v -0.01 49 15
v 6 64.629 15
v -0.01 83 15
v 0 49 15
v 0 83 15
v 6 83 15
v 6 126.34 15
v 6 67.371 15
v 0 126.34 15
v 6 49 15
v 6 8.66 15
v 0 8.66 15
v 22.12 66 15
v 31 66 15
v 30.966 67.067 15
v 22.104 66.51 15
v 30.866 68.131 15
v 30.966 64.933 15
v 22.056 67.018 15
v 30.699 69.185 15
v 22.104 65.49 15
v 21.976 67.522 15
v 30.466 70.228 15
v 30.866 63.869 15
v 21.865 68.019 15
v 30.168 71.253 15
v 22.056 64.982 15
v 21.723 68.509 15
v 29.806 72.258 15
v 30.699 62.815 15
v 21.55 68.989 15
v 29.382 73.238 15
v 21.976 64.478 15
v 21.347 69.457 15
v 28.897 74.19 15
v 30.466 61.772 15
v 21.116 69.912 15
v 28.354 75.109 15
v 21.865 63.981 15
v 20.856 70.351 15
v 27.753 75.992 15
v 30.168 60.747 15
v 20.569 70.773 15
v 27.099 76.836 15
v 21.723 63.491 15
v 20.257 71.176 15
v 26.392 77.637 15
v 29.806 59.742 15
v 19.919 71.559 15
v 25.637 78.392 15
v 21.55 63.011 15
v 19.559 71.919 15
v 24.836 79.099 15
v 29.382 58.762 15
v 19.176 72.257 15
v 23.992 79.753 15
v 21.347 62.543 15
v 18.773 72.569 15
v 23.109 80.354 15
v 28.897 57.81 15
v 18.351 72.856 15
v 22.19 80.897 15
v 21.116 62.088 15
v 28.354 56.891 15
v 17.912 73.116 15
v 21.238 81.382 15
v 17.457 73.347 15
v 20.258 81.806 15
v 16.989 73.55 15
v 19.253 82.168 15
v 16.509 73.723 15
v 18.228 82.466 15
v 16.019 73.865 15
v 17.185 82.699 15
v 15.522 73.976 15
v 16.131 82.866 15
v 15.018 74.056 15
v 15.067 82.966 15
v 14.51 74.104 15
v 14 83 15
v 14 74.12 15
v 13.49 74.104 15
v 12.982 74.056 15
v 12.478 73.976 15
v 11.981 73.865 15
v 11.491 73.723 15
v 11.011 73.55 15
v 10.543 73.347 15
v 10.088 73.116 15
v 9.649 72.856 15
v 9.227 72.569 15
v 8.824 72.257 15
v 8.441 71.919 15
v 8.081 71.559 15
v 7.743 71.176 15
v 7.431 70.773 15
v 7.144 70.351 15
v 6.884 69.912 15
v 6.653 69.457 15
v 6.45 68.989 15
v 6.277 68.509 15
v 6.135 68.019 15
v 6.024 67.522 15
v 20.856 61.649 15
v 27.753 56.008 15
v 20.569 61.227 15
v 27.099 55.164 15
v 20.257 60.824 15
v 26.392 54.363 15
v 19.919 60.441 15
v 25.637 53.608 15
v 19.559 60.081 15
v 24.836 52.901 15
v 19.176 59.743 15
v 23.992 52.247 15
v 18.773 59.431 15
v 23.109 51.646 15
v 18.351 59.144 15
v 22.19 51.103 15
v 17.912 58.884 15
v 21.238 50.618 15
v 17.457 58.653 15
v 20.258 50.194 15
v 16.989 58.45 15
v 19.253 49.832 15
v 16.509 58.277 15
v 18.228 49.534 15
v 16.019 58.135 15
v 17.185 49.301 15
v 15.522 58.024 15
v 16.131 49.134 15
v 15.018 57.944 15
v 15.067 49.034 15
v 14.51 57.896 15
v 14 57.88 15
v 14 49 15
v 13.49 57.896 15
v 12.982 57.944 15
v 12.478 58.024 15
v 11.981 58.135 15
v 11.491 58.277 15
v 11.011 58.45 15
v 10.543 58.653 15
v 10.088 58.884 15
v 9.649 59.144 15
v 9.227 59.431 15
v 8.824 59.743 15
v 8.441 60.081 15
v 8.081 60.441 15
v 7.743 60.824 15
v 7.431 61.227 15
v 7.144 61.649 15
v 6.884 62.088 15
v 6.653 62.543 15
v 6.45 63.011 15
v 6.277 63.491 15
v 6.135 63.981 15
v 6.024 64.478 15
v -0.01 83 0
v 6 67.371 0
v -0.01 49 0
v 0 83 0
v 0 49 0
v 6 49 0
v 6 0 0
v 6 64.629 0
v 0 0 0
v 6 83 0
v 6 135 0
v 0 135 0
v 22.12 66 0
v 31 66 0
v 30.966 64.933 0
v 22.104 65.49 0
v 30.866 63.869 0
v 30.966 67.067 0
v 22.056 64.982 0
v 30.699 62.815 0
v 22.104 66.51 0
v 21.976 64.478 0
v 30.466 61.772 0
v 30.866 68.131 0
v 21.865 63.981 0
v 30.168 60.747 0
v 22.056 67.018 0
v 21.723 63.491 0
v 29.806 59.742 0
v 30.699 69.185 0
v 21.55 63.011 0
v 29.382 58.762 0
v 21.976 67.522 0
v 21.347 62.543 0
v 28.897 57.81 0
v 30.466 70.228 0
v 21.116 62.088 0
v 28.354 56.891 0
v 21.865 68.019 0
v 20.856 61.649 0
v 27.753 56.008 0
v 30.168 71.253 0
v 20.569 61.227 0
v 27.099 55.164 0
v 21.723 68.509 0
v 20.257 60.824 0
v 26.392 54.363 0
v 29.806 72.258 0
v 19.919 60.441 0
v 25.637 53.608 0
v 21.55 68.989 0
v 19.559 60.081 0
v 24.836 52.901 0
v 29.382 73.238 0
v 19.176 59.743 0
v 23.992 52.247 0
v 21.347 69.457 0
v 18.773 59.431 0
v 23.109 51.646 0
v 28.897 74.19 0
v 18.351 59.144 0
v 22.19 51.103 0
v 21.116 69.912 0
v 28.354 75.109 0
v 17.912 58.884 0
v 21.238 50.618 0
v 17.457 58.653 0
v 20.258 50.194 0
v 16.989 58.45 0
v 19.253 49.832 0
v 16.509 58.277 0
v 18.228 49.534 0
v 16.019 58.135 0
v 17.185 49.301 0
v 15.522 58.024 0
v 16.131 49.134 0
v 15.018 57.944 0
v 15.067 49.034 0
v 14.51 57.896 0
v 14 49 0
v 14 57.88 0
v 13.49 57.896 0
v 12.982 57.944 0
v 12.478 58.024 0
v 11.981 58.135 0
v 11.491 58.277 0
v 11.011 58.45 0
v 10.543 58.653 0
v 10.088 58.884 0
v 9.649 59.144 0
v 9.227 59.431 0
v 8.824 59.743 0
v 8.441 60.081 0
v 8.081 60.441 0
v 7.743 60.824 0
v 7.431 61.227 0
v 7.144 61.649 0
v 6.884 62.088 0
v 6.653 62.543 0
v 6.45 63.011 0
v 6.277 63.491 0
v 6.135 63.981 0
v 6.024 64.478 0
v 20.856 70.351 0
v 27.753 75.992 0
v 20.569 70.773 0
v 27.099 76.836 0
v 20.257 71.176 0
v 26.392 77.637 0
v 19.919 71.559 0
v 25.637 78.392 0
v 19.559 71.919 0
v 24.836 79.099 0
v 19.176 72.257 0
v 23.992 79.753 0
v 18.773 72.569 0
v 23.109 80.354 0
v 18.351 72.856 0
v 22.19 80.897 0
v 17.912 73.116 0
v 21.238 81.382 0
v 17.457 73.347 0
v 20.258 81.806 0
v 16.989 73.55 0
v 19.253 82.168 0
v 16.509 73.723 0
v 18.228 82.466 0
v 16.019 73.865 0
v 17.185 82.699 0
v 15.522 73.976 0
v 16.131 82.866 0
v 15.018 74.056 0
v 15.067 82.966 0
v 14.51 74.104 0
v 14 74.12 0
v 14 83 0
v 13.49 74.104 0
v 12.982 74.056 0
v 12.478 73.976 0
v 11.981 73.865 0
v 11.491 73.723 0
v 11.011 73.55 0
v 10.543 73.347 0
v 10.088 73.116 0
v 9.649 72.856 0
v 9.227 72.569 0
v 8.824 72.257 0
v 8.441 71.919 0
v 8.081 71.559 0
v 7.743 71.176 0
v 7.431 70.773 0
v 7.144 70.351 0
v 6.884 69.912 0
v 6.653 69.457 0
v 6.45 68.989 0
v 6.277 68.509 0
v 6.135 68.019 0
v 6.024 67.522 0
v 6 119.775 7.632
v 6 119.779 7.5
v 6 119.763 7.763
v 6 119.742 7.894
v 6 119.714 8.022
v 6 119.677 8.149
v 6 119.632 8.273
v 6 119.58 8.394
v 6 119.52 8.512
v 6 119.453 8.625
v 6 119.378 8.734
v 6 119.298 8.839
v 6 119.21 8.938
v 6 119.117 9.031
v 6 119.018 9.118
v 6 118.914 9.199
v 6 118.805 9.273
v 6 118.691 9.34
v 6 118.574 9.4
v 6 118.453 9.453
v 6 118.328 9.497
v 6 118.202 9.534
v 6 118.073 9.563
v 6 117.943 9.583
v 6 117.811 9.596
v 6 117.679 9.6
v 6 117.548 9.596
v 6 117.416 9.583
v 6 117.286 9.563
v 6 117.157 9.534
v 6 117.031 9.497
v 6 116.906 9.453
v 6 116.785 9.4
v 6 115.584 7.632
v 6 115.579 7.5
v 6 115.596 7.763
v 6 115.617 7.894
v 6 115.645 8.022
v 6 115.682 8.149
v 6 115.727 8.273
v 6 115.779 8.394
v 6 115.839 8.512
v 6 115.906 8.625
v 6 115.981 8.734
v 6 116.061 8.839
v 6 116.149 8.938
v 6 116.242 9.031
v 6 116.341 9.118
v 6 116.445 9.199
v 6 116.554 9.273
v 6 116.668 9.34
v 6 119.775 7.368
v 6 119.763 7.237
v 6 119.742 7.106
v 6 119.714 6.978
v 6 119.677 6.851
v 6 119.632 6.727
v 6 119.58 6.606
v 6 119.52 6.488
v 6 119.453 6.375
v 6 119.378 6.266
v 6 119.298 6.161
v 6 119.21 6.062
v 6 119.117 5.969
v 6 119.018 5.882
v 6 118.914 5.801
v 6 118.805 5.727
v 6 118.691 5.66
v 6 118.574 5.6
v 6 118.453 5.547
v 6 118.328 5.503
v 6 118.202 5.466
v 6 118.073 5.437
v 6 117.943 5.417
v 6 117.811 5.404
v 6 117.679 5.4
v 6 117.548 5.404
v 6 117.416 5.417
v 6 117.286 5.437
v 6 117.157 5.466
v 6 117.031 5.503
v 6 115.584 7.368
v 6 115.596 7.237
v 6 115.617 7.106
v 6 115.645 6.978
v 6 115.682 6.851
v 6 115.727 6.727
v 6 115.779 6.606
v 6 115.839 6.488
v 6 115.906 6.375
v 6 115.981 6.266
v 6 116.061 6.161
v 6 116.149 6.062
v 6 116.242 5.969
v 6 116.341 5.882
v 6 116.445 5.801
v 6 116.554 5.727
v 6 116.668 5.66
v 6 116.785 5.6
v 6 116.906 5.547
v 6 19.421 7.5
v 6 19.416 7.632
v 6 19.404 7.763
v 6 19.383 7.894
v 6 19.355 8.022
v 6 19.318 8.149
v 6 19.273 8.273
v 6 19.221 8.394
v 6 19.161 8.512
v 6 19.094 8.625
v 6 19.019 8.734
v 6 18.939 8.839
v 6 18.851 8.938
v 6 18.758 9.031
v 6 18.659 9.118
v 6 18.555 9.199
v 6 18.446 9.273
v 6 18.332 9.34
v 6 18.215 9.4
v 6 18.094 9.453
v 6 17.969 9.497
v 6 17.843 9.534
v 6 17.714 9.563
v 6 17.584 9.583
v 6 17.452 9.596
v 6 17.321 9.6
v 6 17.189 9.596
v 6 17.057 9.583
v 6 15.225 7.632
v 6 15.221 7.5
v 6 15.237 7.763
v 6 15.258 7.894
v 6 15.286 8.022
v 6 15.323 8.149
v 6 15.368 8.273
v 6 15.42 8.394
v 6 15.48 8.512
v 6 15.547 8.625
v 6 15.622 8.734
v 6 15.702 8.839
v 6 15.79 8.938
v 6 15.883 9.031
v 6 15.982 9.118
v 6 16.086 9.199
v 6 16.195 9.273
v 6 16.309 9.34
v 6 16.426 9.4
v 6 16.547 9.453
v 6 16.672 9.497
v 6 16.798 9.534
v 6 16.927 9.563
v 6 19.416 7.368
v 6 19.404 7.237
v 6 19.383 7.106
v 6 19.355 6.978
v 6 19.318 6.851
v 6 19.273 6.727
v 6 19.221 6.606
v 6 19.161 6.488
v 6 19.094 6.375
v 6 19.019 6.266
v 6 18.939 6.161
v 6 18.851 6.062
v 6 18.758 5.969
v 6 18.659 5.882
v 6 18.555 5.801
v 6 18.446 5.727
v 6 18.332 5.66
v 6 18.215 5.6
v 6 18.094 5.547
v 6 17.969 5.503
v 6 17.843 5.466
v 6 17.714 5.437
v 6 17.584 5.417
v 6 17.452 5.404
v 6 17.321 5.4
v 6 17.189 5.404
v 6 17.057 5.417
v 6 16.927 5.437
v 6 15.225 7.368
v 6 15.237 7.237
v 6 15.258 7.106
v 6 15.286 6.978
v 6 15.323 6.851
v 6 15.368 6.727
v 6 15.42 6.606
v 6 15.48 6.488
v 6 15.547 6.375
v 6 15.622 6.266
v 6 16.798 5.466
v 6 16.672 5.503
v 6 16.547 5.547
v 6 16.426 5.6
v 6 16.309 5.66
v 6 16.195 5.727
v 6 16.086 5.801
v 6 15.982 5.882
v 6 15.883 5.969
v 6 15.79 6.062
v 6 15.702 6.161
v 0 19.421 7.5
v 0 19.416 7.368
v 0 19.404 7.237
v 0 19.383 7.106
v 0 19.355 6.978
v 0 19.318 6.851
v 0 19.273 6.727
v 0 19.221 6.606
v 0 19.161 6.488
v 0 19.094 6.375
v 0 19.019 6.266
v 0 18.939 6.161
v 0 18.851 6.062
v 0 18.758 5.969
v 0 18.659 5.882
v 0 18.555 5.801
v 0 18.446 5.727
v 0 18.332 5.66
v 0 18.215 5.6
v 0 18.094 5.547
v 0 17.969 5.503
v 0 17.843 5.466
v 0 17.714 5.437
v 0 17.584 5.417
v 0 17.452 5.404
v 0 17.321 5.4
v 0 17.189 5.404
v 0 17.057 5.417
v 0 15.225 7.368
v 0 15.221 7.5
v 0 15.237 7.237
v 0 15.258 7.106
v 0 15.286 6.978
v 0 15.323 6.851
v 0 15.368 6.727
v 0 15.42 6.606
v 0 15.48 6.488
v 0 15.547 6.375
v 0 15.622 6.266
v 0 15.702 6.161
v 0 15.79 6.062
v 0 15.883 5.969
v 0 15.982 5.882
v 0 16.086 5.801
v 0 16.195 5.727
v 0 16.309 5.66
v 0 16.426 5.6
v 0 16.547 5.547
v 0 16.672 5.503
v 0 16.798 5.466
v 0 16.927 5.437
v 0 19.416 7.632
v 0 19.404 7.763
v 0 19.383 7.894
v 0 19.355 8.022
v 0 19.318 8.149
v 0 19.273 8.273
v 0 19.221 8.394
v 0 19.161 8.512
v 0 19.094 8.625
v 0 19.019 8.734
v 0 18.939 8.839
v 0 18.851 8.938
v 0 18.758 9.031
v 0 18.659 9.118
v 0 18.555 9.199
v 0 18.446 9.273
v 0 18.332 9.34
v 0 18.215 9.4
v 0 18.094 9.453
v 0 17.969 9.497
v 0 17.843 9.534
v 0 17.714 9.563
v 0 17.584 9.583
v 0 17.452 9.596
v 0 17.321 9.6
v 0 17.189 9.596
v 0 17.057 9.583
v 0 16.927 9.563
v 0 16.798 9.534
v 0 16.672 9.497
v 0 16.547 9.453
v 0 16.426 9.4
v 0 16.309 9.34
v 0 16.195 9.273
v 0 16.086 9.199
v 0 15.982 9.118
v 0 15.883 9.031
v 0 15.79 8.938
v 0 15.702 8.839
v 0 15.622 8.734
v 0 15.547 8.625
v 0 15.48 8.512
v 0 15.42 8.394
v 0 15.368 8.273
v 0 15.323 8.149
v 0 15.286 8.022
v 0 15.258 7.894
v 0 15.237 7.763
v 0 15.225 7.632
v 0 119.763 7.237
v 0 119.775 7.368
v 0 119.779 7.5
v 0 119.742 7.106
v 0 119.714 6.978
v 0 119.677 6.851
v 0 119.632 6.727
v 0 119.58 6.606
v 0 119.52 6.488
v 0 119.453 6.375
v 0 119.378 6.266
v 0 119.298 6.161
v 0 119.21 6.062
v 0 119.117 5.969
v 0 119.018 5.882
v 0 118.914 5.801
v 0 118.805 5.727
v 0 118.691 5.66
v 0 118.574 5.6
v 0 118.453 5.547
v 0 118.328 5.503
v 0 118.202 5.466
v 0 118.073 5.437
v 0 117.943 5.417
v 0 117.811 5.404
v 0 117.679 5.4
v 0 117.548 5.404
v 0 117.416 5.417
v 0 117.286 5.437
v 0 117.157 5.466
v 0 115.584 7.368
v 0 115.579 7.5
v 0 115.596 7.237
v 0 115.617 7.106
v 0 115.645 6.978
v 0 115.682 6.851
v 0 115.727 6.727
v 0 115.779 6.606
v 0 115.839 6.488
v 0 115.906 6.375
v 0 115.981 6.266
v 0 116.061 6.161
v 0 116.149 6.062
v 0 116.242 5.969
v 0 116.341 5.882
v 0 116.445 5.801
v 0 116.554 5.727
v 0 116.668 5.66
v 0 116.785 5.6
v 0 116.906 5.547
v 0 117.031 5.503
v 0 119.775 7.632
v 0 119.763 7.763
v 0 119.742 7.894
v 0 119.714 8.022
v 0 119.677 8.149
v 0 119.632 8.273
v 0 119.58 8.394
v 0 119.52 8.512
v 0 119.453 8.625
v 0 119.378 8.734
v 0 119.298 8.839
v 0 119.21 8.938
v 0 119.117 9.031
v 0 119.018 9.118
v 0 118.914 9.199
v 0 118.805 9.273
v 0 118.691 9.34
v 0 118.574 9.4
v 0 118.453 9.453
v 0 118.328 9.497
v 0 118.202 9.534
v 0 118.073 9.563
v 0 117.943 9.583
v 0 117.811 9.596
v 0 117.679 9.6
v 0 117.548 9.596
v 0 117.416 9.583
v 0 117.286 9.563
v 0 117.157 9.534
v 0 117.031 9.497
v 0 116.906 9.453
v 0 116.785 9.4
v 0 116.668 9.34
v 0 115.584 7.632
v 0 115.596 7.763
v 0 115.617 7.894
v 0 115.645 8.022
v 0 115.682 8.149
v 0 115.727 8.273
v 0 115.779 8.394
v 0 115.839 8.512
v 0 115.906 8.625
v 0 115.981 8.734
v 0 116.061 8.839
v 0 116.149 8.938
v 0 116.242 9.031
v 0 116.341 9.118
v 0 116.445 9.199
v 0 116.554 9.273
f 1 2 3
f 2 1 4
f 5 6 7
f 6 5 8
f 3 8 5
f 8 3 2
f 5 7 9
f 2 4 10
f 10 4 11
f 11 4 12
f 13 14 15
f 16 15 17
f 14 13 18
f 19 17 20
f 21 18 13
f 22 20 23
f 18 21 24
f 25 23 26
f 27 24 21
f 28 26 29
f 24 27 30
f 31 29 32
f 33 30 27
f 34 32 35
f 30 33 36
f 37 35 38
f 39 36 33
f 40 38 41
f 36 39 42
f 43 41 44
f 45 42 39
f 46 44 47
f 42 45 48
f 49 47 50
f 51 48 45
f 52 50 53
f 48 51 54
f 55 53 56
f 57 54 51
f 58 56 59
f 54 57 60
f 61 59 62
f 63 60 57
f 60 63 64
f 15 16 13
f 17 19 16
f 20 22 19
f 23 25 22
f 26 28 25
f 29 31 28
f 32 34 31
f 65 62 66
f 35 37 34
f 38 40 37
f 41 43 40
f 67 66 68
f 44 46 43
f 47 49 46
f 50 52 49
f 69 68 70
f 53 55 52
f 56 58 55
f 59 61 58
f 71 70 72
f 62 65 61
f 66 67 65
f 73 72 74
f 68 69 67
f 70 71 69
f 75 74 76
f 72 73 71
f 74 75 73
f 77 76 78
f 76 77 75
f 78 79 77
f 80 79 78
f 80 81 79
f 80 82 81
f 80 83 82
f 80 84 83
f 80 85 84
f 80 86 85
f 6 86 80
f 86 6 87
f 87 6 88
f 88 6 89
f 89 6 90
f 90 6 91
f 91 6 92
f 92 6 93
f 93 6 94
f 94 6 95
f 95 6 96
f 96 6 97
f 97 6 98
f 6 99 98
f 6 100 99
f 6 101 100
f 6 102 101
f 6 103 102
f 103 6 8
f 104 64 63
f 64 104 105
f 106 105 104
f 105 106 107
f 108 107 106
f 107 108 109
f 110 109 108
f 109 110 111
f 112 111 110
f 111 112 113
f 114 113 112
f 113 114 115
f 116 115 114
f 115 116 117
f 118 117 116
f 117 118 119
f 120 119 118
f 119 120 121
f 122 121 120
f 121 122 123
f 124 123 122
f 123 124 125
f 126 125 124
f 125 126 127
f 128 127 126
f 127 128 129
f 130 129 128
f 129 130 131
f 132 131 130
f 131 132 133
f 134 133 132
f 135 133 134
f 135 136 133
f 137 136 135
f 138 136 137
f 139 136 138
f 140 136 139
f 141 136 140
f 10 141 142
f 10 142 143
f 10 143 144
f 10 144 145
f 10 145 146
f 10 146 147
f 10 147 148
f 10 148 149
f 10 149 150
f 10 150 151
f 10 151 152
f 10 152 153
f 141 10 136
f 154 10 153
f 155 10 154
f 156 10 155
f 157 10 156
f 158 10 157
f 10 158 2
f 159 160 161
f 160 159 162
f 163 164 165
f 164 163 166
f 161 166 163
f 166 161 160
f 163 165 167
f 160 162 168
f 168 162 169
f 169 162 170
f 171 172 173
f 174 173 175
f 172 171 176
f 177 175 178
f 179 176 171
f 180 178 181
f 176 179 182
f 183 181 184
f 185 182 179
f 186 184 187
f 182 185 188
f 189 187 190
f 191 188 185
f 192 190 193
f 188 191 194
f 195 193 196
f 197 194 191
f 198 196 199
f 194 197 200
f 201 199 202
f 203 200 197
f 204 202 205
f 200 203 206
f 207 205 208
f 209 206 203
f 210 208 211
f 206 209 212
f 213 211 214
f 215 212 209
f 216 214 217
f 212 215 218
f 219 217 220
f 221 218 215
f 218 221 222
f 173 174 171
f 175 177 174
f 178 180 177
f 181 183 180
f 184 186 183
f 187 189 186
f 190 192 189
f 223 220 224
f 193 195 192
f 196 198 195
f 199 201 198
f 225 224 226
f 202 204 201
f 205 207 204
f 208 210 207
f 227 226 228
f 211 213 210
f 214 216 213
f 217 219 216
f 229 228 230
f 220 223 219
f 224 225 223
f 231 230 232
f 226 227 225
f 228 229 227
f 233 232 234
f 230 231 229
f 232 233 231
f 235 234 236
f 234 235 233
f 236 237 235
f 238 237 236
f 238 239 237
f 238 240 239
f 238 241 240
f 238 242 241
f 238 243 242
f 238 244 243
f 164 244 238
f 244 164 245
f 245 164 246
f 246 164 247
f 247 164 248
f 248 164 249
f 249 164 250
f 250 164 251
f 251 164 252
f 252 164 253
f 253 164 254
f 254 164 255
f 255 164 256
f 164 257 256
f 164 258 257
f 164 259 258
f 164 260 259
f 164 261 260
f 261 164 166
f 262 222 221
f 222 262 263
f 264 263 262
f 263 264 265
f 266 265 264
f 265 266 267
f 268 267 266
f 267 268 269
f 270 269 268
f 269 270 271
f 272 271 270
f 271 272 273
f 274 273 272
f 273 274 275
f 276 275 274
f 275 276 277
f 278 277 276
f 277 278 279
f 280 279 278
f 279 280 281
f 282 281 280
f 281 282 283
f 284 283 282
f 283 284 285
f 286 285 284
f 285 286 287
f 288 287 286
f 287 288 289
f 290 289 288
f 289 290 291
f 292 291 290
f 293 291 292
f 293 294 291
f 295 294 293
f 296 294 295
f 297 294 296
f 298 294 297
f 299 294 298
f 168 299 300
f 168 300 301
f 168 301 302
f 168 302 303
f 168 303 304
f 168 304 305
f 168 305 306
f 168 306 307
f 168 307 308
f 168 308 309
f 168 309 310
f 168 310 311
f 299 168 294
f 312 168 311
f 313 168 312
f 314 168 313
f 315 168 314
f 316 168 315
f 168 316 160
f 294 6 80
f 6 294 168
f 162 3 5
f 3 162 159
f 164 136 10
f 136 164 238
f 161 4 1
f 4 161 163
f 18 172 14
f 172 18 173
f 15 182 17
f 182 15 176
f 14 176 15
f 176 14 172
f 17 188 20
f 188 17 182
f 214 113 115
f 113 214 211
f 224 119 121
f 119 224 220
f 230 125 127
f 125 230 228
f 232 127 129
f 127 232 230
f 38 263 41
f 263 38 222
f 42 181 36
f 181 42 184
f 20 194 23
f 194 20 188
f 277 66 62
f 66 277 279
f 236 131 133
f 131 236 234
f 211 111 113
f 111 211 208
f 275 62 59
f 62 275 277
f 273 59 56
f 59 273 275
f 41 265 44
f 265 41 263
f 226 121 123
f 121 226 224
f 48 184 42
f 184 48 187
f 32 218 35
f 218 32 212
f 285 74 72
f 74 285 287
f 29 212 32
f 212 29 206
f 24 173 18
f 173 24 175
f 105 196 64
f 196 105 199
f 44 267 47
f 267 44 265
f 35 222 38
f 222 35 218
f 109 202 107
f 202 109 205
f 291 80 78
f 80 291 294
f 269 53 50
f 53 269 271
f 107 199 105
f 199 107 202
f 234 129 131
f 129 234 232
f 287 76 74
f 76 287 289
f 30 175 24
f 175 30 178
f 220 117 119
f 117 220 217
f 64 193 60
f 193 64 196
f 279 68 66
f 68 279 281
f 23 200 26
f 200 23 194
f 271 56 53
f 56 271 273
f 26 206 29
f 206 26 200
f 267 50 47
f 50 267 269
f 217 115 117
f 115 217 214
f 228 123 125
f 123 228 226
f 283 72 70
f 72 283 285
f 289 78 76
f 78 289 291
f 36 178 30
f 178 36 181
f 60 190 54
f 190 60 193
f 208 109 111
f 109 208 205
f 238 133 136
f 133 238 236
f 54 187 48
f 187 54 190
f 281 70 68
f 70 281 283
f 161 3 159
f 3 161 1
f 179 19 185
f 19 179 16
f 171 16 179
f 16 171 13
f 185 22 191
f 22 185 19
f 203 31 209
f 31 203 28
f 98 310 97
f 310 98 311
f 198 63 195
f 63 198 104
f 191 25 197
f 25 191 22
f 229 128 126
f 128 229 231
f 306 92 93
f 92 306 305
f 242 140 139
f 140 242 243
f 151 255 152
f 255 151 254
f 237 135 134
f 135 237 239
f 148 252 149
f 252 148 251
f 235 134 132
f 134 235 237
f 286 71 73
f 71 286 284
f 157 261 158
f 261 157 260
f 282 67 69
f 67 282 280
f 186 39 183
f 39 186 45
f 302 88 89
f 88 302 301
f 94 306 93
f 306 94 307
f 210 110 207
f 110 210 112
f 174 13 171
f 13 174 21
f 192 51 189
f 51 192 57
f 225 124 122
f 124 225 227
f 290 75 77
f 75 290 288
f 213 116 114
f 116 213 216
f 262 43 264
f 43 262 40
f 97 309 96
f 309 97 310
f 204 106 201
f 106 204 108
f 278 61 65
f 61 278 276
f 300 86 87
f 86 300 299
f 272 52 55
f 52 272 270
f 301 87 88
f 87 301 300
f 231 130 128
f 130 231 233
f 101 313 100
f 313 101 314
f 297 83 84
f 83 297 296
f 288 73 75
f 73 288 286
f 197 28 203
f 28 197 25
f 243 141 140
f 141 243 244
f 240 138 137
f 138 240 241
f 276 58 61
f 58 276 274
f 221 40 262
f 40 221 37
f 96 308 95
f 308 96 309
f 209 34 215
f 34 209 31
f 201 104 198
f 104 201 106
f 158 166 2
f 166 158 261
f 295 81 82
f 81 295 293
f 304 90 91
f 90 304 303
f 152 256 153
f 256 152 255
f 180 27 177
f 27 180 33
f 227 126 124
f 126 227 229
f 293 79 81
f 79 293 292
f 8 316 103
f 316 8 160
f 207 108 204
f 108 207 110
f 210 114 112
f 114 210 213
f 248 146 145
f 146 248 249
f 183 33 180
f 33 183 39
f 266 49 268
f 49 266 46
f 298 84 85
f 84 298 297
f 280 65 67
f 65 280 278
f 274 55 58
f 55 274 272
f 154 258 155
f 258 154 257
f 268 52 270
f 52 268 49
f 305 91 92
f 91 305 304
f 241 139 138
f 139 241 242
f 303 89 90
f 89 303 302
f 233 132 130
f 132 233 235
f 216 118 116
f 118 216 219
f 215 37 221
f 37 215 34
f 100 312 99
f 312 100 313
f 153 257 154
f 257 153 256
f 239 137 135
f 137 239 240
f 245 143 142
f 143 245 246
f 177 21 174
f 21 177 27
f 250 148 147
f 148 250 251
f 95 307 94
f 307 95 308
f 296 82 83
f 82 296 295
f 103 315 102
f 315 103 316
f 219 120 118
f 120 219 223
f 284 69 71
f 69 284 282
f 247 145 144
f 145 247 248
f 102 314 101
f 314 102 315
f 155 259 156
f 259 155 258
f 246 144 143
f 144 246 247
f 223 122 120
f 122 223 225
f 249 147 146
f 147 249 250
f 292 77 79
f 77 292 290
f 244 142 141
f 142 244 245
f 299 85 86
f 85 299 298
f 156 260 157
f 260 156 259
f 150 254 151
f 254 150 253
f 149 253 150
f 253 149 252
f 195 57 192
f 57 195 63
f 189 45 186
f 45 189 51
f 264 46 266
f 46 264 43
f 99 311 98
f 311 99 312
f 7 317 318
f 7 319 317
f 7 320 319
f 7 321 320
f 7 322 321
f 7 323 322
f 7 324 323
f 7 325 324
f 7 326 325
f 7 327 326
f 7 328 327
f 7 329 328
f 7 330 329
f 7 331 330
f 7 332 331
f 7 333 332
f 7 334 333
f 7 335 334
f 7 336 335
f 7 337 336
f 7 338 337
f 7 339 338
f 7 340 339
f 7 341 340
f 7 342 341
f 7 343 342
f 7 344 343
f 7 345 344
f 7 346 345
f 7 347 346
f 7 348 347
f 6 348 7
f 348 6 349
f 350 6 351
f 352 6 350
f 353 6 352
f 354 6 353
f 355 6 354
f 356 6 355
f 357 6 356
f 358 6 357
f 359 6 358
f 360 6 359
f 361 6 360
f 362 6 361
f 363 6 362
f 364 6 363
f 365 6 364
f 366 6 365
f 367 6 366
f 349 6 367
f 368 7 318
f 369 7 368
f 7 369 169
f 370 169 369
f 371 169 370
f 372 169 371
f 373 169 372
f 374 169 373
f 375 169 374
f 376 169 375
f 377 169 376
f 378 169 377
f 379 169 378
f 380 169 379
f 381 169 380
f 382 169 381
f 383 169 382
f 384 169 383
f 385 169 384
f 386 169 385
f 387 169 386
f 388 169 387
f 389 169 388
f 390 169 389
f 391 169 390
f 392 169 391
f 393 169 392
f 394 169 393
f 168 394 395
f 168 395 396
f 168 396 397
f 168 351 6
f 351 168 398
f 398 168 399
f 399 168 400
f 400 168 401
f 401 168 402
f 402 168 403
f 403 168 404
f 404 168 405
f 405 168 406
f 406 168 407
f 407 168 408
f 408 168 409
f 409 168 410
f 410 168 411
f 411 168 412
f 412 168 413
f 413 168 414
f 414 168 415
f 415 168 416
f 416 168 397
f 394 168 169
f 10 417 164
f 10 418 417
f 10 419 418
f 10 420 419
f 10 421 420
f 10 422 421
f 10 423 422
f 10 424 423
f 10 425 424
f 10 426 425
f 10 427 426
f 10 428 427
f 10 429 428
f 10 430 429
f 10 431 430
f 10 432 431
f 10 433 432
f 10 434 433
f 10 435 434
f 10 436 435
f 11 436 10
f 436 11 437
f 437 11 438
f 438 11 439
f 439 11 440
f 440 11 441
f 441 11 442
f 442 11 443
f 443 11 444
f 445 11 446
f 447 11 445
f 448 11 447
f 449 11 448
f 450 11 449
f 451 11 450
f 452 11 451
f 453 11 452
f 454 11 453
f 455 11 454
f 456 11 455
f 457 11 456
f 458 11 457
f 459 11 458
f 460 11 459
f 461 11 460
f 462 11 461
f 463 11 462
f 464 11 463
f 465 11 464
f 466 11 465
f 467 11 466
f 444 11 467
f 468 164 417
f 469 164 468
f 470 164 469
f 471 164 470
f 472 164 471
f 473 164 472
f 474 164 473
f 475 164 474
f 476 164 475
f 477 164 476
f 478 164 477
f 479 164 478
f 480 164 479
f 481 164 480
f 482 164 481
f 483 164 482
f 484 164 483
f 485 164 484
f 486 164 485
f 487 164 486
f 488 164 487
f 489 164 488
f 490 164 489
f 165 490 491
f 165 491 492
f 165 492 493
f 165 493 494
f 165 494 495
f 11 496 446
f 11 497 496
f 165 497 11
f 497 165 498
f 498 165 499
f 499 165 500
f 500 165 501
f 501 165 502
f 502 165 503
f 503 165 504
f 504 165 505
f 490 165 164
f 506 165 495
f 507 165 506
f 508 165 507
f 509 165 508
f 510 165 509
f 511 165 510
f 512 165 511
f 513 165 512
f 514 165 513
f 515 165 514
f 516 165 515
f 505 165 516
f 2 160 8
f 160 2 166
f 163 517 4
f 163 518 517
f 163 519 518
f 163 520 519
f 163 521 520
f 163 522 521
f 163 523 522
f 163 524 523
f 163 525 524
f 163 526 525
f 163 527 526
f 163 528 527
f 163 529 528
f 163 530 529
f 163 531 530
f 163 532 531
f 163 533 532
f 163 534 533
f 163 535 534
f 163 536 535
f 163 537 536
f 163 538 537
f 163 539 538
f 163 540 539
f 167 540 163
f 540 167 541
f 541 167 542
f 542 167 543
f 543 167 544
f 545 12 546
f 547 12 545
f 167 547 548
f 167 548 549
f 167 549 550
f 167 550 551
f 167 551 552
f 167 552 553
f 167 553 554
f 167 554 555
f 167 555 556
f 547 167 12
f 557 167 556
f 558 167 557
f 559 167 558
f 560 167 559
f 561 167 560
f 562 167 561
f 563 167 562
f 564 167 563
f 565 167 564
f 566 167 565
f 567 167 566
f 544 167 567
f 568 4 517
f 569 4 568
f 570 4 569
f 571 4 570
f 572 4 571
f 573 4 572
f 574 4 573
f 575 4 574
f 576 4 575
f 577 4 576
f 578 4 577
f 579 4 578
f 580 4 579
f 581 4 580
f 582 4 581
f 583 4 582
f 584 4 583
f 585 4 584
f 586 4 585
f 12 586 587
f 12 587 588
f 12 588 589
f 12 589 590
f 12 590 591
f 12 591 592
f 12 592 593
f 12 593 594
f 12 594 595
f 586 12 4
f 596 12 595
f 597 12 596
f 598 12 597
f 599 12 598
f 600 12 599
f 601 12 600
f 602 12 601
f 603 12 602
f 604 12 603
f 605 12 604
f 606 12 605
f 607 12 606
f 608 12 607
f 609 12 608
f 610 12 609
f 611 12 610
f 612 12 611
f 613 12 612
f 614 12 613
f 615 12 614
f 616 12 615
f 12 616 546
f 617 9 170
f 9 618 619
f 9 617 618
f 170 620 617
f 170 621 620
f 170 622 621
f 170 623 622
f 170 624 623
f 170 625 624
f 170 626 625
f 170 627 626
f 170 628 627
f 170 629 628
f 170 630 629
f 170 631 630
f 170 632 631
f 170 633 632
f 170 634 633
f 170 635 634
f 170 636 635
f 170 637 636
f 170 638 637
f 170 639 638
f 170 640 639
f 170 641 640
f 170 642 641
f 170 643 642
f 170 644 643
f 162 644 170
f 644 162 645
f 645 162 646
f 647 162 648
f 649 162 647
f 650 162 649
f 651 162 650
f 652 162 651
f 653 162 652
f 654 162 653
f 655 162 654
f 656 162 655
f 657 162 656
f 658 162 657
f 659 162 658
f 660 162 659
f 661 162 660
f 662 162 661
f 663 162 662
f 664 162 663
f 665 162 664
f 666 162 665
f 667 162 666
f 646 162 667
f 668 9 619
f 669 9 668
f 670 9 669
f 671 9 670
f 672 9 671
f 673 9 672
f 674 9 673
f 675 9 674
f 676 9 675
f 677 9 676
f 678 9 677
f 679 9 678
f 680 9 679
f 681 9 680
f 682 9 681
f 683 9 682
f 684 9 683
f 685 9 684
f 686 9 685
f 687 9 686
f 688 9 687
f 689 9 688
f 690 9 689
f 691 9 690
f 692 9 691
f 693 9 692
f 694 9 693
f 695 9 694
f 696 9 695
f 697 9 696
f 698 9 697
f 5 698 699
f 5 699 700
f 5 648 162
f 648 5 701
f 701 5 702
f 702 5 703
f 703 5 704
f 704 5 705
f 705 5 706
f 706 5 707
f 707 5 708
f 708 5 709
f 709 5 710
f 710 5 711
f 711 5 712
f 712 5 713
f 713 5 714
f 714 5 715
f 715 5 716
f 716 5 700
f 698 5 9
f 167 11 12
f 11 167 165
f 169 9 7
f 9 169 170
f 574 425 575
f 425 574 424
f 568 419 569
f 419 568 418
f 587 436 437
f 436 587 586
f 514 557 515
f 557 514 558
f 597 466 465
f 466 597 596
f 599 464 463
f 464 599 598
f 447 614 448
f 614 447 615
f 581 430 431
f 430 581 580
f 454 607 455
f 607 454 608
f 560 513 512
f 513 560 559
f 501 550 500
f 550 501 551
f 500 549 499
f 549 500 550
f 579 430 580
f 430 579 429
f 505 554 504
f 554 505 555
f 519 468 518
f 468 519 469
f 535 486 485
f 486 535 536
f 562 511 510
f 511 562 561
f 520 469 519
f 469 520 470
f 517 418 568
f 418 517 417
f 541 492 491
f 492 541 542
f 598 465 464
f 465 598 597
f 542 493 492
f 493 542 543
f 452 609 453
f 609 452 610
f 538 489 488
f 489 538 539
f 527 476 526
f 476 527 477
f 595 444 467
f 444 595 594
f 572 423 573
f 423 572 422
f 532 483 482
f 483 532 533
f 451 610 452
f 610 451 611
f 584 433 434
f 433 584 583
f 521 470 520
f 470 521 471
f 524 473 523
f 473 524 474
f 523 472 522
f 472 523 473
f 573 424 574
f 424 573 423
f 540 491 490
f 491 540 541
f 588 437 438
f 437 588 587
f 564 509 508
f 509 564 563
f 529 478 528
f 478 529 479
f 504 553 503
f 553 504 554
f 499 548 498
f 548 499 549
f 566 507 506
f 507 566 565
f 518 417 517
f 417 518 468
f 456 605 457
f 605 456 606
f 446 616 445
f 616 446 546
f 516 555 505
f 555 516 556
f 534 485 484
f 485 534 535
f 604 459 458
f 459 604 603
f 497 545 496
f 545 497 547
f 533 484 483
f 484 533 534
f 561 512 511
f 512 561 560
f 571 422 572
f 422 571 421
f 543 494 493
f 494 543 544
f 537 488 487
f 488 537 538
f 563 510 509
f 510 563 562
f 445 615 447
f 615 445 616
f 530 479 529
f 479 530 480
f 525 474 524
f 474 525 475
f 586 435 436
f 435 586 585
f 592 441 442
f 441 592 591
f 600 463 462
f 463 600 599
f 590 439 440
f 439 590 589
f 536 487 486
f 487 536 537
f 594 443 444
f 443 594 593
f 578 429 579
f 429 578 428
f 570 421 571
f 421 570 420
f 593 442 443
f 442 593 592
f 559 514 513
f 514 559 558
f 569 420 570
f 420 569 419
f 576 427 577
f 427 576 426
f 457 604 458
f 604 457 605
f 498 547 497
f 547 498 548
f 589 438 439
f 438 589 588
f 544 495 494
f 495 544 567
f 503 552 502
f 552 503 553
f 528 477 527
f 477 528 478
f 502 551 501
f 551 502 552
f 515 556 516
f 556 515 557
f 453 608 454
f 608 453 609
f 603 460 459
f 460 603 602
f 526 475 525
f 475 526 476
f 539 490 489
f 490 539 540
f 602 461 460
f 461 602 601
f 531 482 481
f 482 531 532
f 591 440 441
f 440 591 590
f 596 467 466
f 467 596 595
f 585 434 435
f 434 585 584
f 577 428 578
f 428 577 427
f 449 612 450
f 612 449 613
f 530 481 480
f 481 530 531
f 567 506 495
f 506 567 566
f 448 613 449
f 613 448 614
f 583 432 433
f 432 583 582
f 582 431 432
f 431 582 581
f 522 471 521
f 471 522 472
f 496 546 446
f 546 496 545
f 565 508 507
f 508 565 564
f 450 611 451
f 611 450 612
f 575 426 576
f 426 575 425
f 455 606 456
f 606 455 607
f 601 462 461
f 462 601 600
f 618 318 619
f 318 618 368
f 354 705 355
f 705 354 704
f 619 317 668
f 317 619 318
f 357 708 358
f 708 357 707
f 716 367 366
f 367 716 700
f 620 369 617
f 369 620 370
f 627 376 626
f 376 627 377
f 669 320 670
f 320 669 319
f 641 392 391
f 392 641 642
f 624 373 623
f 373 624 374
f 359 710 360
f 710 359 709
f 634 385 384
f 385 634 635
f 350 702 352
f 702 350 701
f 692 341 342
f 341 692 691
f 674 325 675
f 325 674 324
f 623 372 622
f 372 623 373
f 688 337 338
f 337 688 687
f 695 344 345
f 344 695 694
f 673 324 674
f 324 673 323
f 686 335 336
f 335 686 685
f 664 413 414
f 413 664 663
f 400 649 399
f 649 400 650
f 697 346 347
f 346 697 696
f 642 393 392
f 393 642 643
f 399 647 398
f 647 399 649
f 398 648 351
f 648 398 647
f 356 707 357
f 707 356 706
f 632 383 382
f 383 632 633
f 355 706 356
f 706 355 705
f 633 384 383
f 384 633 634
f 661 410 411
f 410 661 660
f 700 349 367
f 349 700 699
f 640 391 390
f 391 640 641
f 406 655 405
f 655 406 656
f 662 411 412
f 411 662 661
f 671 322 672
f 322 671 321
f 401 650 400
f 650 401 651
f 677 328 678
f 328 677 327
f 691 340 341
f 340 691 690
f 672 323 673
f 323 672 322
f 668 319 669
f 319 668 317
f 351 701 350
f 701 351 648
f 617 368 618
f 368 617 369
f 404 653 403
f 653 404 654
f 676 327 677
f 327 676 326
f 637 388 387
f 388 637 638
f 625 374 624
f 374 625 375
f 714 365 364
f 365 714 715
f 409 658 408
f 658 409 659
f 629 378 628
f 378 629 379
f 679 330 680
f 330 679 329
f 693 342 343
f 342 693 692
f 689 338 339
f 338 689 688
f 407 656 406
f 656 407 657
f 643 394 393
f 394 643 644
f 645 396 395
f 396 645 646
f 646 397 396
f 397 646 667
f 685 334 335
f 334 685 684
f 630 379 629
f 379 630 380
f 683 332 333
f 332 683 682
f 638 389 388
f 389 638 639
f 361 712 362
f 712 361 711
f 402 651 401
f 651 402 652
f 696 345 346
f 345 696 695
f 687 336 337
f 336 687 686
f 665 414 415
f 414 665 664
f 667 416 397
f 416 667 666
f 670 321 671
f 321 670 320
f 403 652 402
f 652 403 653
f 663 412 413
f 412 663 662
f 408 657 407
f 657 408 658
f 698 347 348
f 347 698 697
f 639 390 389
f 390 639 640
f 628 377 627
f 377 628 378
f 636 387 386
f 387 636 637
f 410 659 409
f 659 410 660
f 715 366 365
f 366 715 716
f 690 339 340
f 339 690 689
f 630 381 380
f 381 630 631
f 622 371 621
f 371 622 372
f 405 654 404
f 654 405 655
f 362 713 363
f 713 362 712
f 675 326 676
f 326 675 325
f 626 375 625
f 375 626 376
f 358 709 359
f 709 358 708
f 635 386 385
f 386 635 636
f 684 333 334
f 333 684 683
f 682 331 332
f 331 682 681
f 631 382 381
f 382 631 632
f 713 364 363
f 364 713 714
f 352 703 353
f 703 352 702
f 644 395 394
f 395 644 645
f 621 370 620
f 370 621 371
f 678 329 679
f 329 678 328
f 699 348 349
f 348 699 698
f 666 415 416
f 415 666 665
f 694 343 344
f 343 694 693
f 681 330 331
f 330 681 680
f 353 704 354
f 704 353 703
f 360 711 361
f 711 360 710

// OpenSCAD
// file: functions.scad
// PRUSA Mendel  
// Functions used in many files
// GNU GPL v2
// Josef Průša
// josefprusa@me.com
// prusadjs.cz
// http://www.reprap.org/wiki/Prusa_Mendel
// http://github.com/prusajr/PrusaMendel

module nut(d,h,horizontal=true){
cornerdiameter =  (d / 2) / cos (180 / 6);
cylinder(h = h, r = cornerdiameter, $fn = 6);
if(horizontal){
for(i = [1:6]){
	rotate([0,0,60*i]) translate([-cornerdiameter-0.2,0,0]) rotate([0,0,-45]) cube(size = [2,2,h]);
}}
}

// By nophead
module polyhole(d,h) {
    n = max(round(2 * d),3);
    rotate([0,0,180])
        cylinder(h = h, r = (d / 2) / cos (180 / n), $fn = n);
}

module roundcorner(diameter){
	difference(){
		cube(size = [diameter,diameter,99], center = false);
		translate(v = [diameter, diameter, 0]) cylinder(h = 100, r=diameter, center=true);
	}
}
// file: metric.scad
// PRUSA Mendel  
// Default metric sizes
// GNU GPL v2
// Josef Průša
// josefprusa@me.com
// prusadjs.cz
// http://www.reprap.org/wiki/Prusa_Mendel
// http://github.com/prusajr/PrusaMendel

// DONT CHANGE THIS FILE! ALTER VALUES IN CONFIGURATION.SCAD INSTEAD

// RODS

threaded_rod_diameter = 8;
threaded_rod_diameter_horizontal = 8;
smooth_bar_diameter = 8;
smooth_bar_diameter_horizontal = 8;

// Nuts and bolts

m8_diameter = 8;
m8_nut_diameter = 14.5;

m4_diameter = 4;
m4_nut_diameter = 7.5;

m3_diameter = 3;
m3_nut_diameter = 5;

// Bushing holder

bushing_core_diameter = smooth_bar_diameter;
bushing_material_thickness = 1;

// Motors

motor_shaft = 5.1;
// file: z-lead-screw-support-retainer.scad
// f. beachler
// longevity software d.b.a. terawatt industries

zleads_bushing_retainer();

module zleads_bushing_retainer() {
	difference() {
		minkowski() {
			union() {
				cube([9 - 3, 35 - 3, 3]);
				translate([6 / 2, 32 / 2, 0]) cylinder(r = 9, h = 3);
			}
			cylinder(r = 3, h = 0.01);
		}
		// slots
		translate([(6 - 3.5) / 2, 25, -0.1]) cube([3 + 0.5, 10, 5 + 1]);
		translate([(6 - 3.5) / 2, -3, -0.1]) cube([3 + 0.5, 10, 5 + 1]);
		translate([6 / 2, 32 / 2, -0.1]) cylinder(r = 5.75, h = 5 + 1);
	}
}
// file: configuration.scad
// PRUSA Mendel  
// Configuration file
// GNU GPL v2
// Josef Průša
// josefprusa@me.com
// prusadjs.cz
// http://www.reprap.org/wiki/Prusa_Mendel
// http://github.com/prusajr/PrusaMendel

// PLEASE SELECT ONE OF THE CONFIGURATIONS BELOW
// BY UN-COMMENTING IT

// Uncomment for metric settings
// METRIC METRIC METRIC METRIC METRIC METRIC METRIC METRIC 

include <metric.scad>;

// Uncomment for imperial settings
// IMPERIAL IMPERIAL IMPERIAL IMPERIAL IMPERIAL IMPERIAL IMPERIAL 

//include <sae.scad>;

//thin_wall = 3;
// LM8UU
//linear = false;

// override settings by customizing below
// CUSTOM CUSTOM CUSTOM CUSTOM CUSTOM CUSTOM CUSTOM CUSTOM CUSTOM

threaded_rod_diameter = 8.2;
threaded_rod_diameter_horizontal = 8.2;
smooth_bar_diameter = 8.3;
smooth_bar_diameter_horizontal = 8.3;

// Nuts and bolts

m8_diameter = 8.3;
m8_nut_diameter = 15;

m4_diameter = 4.2;
m4_nut_diameter = 9;

m3_diameter = 3.3;
m3_nut_diameter = 5.8;

///counted stuff
m3_nut_diameter_bigger = ((m3_nut_diameter  / 2) / cos (180 / 6))*2;

// functions 
include <functions.scad>
// main file
// C. Strang original SCAD from Prism sketchup design file
// f beachler AB mods for bushing and retainer
// longevity software d.b.a. terawatt industries


include <configuration.scad>;
// FIXME use or remove from this project
use <z-lead-screw-support-retainer.scad>;

width = 135;			// end-to-end width at corners
h = 6;   			// base thickness
o = 0.01;			//  overlap amount
st=2;				// slot tab depth
bushing_dia = 15.79 + 0.45;
m = m4_diameter;

$fn=100;

translate([0,0,0]) zleads_upper(width, h, st, m, bushing_dia);

module zleads_upper(w, zlh, zls, zlm, bd)
{
	translate([0, w / 2 - 34, 0]) bearingholder(bd);
	base(w, zlh, zls, zlm);
}

module base(w, bh, bs, bm)
{
	difference()
	{
		union()
		{
			translate([0,0,0]) cube([bh, w, 15]);
//			translate([0, w - w/ 2, 0]) cube([bh, w / 3, 15]);
//			translate([-bs+o, w / 2 - 41, 7.5]) cube([bs+2*o, 41, 5]);
		}
		// side cuts
		translate([-o, 0, 0]) rotate([60, 0, 0]) cube([bh + 2 * o, 50, 20]);
		translate([-o, w - 50 * sin(30), 50 * cos(30)]) rotate([-60, 0, 0]) cube([bh + 2 * o, 50, 20]);
		// screw holes
		translate([-o, 20 * cos(30), 15 / 2]) rotate([0,90,0]) cylinder(r=bm/2,h=bh+2*o);
		translate([-o, w - 20 * cos(30), 15 / 2]) rotate([0,90,0]) cylinder(r=bm/2,h=bh+2*o);
	}
}

module bearingholder(bd)
{
	difference()
	{
		union()
		{
			translate([-6,15.5,0]) cube([20, 34, 15]);
			translate([14,32.5,0]) cylinder(r=34 / 2, h=15);
		}
		// remove overhang
		translate([-22.01, 15, -1]) cube([22, 36, 30]);
		// bushing holes
		translate([14, 32.5, -o]) cylinder(r = bd / 2, h = 25 + 2 * o);
		// bushing retainer holes
/*		translate([14, 20 , -o]) cylinder(r = m3_diameter/2, h = 25 + 2*o);
		translate([14, 45 , -o]) cylinder(r = m3_diameter/2, h = 25 + 2*o); */
	}

}
